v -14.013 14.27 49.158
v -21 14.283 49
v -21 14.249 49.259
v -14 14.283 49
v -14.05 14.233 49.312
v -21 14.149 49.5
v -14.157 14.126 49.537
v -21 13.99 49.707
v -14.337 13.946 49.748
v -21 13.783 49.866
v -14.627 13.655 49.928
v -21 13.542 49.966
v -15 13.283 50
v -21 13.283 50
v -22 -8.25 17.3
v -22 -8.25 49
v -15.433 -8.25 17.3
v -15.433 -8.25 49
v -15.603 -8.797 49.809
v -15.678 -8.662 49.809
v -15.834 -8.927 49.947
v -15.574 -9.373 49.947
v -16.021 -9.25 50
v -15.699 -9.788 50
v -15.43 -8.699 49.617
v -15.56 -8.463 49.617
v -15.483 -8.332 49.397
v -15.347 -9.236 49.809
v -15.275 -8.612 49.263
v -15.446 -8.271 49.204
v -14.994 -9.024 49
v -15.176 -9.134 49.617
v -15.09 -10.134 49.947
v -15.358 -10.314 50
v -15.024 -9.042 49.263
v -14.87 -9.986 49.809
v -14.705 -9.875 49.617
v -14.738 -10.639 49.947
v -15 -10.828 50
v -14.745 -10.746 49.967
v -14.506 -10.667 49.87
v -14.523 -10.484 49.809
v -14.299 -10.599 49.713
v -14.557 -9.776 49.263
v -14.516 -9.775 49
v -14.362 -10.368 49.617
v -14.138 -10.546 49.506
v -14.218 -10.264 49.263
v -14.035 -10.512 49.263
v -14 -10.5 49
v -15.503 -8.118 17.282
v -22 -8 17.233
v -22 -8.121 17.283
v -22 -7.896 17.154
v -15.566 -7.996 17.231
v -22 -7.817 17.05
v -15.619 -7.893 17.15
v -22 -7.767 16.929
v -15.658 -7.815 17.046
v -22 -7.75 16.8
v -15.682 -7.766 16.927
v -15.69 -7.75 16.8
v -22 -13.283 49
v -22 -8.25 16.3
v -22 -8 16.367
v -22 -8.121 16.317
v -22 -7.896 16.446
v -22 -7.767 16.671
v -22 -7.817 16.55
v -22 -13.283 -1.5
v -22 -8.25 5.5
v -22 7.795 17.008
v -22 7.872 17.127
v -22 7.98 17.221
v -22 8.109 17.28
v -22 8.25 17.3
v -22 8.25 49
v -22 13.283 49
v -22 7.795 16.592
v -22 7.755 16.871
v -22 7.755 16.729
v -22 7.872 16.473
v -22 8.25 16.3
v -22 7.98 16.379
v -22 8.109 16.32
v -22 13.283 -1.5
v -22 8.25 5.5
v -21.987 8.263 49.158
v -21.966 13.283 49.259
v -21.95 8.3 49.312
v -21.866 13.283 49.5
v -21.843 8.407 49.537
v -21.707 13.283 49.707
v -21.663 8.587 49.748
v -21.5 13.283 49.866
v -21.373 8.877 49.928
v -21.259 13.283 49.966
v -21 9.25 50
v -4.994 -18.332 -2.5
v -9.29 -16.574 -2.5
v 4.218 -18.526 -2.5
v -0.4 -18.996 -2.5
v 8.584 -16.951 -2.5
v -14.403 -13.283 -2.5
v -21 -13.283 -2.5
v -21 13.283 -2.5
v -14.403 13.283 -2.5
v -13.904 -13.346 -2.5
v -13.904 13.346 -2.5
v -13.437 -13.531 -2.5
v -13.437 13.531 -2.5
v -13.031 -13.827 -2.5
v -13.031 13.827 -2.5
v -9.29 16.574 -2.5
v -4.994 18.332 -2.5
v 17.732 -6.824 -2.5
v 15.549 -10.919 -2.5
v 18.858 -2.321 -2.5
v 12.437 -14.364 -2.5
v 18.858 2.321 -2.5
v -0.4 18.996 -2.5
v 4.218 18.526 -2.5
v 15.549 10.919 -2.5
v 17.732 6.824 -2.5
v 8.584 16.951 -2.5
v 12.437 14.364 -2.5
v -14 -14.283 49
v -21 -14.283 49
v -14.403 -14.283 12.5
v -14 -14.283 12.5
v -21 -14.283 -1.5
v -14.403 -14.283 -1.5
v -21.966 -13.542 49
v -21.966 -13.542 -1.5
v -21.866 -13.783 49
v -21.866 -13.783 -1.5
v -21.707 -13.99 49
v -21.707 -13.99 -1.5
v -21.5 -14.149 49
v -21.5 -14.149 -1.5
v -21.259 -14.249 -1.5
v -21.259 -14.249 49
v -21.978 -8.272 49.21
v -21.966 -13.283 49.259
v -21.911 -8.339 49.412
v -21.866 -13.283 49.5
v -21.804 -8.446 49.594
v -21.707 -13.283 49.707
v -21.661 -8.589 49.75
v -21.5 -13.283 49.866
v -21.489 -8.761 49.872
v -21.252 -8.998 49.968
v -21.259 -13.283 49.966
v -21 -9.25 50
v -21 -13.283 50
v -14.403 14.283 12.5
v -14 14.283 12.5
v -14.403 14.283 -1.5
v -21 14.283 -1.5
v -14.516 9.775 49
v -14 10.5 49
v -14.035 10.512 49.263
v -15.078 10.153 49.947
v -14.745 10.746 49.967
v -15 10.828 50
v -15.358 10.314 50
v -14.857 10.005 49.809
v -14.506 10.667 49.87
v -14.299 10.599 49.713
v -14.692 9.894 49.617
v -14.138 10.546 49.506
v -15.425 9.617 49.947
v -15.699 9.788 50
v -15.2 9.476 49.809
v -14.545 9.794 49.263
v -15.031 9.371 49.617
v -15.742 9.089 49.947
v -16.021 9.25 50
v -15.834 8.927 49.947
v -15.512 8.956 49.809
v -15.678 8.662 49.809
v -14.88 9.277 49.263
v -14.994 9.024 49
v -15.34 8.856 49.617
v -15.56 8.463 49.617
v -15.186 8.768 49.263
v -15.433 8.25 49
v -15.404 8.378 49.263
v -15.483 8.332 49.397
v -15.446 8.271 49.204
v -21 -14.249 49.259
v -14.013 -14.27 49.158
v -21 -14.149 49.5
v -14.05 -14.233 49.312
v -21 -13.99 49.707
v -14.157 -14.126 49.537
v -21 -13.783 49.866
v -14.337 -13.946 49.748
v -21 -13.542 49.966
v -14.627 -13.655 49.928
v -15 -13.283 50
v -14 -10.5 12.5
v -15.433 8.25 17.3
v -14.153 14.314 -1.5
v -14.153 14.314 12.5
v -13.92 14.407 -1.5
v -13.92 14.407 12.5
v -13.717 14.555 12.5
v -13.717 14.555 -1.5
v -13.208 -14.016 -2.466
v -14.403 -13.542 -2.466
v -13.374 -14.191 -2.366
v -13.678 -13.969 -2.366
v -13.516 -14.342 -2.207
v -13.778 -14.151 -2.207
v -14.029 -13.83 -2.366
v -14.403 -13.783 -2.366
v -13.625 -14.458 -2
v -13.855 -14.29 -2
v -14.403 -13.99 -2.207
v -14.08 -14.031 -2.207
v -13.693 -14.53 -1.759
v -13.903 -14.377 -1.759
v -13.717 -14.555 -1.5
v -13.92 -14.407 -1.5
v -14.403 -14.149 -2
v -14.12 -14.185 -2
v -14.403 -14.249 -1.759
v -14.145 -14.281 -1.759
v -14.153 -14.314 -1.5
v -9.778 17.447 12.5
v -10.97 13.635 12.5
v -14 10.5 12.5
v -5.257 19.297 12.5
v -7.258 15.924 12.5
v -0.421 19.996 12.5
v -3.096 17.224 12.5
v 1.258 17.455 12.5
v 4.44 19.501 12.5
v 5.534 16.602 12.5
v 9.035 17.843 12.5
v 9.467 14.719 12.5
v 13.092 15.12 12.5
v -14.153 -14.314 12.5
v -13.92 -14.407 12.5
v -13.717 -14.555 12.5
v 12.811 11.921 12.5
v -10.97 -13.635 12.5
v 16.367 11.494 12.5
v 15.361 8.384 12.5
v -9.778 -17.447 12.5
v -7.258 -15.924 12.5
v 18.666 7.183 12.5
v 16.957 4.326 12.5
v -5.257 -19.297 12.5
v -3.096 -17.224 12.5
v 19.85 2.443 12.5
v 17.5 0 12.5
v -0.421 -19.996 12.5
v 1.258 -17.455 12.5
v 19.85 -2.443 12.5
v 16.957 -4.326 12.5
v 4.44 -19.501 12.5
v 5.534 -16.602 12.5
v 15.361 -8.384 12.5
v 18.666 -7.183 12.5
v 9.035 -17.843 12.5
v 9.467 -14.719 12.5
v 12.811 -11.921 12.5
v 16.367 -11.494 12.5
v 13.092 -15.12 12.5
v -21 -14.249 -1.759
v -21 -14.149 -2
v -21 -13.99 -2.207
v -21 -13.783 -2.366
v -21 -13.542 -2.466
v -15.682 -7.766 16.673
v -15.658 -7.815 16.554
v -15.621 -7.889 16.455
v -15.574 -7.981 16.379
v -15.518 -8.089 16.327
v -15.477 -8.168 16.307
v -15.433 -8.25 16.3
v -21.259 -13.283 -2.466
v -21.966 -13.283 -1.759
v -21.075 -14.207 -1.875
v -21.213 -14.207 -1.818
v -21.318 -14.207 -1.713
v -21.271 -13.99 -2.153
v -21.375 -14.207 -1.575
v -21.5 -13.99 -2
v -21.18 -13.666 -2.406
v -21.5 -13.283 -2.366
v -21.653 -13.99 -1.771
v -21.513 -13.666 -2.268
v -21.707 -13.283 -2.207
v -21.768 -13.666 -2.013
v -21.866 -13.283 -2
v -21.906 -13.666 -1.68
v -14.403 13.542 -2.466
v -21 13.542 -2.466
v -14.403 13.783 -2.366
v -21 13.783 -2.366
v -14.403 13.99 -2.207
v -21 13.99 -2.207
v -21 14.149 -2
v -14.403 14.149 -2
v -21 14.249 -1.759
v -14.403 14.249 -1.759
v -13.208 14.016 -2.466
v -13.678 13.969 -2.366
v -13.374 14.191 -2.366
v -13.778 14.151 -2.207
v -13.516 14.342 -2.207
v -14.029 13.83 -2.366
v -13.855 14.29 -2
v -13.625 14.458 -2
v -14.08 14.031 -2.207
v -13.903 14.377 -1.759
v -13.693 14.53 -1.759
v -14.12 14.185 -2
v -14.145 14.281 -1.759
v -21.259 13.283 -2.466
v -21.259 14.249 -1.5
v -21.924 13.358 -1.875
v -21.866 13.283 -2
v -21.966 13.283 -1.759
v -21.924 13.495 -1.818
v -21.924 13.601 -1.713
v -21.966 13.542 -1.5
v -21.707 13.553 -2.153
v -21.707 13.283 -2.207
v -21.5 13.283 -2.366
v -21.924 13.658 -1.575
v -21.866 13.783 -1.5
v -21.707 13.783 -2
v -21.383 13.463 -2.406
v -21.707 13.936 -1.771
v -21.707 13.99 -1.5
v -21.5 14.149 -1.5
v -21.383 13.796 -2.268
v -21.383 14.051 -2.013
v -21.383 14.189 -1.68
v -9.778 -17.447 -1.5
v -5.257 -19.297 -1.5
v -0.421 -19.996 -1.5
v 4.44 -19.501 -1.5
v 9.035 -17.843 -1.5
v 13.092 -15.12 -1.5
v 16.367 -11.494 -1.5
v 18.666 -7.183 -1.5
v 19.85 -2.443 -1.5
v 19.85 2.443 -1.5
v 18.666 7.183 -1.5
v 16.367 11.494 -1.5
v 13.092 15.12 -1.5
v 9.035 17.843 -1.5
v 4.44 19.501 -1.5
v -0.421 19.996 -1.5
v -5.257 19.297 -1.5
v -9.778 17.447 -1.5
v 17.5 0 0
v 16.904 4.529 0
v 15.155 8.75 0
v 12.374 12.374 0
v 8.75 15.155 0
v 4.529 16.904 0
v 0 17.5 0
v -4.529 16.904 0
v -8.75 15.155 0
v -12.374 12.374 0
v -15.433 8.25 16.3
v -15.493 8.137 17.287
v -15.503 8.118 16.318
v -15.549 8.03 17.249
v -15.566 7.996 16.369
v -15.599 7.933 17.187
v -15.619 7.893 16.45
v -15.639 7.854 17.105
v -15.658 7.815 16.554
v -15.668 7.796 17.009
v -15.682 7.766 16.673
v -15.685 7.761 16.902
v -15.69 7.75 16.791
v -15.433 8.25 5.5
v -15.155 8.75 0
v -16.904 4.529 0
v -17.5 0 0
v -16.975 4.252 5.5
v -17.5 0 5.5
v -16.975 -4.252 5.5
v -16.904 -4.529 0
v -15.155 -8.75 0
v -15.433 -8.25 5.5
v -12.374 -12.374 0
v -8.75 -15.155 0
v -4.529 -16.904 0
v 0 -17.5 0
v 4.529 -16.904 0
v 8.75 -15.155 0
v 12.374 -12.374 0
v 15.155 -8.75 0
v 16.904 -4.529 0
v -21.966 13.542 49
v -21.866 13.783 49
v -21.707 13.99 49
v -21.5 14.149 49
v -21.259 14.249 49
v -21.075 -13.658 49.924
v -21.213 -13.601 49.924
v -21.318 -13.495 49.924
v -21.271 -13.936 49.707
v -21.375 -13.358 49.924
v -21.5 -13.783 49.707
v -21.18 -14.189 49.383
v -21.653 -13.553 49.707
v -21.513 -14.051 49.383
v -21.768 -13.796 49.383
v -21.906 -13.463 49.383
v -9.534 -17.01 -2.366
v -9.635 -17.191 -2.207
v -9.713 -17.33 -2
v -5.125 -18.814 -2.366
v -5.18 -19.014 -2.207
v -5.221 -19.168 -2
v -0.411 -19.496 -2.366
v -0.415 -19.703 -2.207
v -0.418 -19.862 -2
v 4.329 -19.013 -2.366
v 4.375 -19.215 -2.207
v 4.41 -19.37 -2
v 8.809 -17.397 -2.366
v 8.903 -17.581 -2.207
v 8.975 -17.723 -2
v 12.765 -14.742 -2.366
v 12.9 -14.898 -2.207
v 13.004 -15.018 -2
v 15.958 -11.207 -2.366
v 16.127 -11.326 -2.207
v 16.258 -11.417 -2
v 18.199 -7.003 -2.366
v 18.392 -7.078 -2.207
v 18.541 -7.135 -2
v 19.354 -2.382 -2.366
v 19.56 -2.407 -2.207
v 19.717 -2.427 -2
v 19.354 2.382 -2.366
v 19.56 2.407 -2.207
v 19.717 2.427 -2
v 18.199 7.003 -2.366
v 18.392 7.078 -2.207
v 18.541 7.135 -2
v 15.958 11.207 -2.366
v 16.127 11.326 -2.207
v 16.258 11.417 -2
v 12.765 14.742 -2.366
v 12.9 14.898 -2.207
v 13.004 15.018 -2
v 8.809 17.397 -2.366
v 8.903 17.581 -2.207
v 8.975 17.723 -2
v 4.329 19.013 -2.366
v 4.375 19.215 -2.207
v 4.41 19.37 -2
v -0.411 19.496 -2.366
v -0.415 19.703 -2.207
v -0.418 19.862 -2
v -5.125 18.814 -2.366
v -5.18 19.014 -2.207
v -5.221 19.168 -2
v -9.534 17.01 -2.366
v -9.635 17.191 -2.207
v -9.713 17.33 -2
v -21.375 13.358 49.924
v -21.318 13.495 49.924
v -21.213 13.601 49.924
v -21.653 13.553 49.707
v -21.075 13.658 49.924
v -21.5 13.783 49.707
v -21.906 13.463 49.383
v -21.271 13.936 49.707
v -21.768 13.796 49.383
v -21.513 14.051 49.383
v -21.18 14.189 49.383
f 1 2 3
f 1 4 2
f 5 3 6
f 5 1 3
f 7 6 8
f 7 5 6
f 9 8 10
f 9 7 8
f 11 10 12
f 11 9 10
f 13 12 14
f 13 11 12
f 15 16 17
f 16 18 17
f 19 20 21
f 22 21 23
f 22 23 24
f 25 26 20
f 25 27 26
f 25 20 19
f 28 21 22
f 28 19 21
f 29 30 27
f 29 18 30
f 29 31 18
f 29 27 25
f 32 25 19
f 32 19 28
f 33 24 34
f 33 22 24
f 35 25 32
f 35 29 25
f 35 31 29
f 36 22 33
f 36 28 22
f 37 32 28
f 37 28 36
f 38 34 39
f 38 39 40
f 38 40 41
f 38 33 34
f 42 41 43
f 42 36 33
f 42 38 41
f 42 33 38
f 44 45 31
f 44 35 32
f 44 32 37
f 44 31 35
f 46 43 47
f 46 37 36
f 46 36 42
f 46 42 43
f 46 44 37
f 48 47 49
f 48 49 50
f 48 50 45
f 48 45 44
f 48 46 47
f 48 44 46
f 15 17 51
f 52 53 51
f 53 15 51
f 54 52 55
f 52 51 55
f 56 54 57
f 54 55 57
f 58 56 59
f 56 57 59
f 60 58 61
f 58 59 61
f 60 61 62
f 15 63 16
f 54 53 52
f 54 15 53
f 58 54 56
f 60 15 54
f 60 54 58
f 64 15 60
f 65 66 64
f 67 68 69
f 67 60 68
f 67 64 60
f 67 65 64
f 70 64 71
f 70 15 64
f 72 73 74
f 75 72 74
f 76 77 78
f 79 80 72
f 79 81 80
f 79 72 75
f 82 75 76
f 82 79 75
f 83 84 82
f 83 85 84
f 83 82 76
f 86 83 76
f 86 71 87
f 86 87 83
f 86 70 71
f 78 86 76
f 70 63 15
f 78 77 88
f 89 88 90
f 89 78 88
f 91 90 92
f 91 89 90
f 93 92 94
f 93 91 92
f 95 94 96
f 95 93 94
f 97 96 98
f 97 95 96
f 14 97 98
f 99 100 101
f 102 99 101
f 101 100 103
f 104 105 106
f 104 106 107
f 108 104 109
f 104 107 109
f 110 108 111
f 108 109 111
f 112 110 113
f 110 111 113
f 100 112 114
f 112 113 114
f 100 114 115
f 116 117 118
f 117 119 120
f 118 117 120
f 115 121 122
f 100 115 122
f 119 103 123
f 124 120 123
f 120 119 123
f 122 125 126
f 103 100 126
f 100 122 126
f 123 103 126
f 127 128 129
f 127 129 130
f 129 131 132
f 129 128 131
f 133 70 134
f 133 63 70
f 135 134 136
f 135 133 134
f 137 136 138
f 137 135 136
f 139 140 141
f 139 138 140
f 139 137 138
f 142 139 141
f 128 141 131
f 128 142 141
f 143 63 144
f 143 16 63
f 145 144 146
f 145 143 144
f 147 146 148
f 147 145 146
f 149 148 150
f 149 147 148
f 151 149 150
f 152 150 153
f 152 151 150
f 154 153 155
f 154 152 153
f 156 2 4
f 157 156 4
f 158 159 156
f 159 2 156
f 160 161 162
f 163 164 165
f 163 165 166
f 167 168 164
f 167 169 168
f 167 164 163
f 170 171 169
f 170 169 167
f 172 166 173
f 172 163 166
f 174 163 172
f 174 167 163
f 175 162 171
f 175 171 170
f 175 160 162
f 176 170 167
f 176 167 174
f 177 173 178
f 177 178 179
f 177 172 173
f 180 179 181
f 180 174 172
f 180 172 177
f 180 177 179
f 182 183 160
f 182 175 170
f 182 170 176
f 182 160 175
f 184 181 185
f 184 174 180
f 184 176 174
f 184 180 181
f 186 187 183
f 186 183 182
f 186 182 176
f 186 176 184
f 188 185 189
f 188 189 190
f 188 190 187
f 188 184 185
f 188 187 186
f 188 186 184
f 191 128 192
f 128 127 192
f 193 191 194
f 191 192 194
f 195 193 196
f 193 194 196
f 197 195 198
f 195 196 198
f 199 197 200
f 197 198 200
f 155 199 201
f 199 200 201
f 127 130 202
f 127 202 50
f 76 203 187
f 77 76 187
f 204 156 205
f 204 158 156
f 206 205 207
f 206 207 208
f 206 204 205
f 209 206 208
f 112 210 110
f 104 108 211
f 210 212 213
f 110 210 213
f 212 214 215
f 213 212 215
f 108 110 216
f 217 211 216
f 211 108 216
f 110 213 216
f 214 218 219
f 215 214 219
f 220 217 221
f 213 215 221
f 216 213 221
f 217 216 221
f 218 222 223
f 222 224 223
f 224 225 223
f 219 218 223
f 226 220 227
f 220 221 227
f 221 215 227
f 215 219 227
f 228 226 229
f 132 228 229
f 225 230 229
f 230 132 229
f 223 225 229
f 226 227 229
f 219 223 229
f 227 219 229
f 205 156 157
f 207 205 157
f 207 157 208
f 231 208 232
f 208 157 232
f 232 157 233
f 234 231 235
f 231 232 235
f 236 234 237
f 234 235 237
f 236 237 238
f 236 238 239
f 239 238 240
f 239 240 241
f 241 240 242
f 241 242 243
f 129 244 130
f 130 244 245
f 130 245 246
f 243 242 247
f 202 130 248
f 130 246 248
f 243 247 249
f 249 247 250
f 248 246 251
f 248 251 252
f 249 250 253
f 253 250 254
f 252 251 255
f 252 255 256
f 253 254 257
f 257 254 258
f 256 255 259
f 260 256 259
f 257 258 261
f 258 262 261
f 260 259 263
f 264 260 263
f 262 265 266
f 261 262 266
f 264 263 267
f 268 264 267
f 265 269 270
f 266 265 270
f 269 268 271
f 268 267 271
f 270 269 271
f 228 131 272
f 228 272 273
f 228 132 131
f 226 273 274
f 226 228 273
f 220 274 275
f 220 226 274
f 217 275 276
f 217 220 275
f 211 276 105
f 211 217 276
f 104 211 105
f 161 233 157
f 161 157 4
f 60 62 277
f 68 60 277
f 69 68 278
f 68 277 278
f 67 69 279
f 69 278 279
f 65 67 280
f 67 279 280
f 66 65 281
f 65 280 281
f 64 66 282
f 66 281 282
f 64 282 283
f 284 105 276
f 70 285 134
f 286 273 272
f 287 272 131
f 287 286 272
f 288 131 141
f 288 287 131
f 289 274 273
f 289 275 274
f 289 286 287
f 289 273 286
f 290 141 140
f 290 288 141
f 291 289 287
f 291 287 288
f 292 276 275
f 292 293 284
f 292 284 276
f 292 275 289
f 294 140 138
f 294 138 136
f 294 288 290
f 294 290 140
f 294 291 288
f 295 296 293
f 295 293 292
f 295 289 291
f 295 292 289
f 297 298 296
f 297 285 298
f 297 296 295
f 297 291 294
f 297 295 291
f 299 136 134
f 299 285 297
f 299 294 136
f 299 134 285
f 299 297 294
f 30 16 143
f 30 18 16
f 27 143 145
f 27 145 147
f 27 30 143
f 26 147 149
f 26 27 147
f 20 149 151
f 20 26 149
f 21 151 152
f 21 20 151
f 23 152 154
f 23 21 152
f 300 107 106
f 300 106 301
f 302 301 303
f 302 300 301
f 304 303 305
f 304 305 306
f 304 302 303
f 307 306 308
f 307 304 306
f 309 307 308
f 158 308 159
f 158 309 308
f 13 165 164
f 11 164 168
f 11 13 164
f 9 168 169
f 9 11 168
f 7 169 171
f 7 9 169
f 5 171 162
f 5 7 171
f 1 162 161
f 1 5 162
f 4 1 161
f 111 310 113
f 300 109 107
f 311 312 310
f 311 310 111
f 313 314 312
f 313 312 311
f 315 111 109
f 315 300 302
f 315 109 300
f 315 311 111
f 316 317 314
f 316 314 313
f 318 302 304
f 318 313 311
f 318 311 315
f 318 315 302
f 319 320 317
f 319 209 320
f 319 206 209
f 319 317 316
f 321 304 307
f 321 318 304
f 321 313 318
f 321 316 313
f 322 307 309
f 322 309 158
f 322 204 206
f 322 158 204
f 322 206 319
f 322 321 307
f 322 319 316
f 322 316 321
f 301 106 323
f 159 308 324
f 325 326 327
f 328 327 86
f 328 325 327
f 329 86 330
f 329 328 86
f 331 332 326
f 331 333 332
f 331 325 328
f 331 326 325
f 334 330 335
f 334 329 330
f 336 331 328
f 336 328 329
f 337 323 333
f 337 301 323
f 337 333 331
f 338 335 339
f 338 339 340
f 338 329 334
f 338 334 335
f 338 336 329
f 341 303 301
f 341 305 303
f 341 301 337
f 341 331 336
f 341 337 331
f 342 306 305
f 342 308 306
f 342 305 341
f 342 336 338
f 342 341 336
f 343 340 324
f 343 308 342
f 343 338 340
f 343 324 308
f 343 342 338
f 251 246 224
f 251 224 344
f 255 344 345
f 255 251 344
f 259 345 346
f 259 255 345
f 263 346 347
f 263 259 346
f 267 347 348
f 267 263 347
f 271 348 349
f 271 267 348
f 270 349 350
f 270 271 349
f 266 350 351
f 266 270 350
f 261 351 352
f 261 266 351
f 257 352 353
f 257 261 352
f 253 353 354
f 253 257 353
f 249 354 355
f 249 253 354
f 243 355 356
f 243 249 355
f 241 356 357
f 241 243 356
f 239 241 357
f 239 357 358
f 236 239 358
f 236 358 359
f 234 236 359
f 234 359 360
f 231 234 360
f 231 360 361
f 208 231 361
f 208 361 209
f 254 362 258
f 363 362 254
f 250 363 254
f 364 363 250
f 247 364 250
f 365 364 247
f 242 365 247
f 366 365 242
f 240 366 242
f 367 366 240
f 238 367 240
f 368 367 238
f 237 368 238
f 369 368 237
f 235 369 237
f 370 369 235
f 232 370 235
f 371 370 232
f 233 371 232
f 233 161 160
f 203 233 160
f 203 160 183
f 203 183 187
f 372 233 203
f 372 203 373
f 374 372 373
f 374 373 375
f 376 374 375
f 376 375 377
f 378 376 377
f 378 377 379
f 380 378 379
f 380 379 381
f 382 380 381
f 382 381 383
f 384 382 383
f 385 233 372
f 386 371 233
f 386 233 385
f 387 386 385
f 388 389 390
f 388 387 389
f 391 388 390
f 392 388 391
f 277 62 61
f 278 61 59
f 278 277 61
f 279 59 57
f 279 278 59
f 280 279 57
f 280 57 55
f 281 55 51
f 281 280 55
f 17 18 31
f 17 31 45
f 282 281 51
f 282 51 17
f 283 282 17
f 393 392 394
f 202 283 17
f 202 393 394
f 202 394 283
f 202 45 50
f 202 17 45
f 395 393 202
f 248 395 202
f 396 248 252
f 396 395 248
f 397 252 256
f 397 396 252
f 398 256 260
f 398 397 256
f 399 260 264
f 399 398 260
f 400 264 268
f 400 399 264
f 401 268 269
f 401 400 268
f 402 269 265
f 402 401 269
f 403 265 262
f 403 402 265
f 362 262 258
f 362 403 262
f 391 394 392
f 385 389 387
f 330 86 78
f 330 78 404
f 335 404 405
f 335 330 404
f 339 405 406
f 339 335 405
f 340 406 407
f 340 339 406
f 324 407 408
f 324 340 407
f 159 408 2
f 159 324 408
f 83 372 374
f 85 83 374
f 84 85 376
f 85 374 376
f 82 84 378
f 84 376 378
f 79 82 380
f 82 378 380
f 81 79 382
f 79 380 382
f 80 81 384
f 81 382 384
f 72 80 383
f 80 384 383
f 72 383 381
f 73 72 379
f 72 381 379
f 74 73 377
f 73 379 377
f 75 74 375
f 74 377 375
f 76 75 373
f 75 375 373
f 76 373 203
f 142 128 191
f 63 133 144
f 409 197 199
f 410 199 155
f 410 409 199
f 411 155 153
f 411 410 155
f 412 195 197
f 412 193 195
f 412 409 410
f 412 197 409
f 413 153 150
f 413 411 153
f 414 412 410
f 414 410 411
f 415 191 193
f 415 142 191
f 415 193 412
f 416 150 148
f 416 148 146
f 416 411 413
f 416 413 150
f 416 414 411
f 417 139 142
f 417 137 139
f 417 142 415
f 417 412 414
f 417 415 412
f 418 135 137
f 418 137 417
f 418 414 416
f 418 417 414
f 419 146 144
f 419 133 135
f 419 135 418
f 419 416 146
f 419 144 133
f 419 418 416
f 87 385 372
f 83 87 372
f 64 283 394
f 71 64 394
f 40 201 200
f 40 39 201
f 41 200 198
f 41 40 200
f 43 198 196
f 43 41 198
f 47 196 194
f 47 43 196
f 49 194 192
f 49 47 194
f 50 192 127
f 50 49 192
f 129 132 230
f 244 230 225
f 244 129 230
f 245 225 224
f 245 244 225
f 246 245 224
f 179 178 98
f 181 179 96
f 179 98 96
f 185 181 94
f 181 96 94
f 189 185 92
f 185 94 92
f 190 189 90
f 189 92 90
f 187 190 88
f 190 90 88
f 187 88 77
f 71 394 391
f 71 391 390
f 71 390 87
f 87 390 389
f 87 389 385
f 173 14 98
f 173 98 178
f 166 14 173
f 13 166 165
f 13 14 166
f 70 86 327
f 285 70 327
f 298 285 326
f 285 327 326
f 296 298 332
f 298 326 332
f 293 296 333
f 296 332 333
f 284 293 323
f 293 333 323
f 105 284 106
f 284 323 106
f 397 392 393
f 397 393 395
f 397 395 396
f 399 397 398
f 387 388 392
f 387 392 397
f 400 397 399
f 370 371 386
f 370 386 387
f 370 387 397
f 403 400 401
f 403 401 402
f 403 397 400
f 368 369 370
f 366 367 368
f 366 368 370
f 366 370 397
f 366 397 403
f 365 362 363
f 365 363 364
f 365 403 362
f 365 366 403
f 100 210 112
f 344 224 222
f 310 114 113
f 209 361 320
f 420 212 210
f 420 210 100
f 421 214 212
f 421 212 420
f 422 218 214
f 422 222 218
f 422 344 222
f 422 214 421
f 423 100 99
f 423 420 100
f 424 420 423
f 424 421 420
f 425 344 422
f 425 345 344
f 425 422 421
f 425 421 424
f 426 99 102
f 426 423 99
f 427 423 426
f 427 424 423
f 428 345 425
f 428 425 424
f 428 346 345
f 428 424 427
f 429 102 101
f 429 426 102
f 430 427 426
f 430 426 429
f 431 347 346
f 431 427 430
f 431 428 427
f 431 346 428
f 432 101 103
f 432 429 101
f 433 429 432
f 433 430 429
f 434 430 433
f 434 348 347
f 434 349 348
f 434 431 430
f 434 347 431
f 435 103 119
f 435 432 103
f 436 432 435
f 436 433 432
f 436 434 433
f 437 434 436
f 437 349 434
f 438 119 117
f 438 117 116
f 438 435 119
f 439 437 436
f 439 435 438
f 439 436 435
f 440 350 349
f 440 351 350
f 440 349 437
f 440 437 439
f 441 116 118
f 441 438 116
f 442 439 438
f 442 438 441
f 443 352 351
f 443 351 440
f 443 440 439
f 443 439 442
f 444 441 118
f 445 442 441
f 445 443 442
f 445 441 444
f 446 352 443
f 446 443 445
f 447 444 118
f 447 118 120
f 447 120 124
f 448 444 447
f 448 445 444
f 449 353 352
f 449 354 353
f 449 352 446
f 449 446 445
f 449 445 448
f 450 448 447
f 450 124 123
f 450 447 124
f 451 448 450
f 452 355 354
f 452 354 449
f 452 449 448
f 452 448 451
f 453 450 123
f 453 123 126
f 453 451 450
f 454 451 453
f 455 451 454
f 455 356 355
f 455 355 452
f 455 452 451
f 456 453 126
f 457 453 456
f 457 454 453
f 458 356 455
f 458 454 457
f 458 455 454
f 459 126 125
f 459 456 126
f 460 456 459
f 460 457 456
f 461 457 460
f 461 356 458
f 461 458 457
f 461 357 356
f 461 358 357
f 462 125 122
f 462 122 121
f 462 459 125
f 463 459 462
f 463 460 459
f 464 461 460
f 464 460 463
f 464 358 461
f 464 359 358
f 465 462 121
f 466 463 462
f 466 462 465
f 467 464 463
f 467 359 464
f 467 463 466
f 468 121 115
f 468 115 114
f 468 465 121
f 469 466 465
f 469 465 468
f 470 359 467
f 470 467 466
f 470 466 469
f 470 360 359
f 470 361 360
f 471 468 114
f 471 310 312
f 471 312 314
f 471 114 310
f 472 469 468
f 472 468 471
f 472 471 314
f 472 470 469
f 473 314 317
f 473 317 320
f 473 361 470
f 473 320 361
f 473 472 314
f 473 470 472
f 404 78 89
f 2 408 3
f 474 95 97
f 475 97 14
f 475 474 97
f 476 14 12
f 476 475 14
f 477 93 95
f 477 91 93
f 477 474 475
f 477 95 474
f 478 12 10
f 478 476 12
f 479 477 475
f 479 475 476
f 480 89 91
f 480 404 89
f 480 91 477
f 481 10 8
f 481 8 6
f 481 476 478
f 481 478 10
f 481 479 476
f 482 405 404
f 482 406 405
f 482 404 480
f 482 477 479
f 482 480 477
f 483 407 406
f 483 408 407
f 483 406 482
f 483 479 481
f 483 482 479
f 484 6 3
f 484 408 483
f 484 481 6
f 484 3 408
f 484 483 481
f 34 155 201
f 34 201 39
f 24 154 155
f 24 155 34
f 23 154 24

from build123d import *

# Parameters (mm, degrees)
F0_R      = 20
F1_DEPTH  = 50
F2_DEPTH  = 2.5
F4_W      = 40
F4_H      = 50
F5_DEPTH  = 25
F6_W      = 8
F6_H      = 28.5657137142
F7_DEPTH  = 2.5
F8_DEPTH  = 50
F3_R      = 17.5
F9_DEPTH  = 50
F11_DEPTH = 25
F12_R     = 1


with BuildPart() as f1:
    # F0 (on Top) → F1 (new body)
    with BuildSketch(Plane.XY):
        Circle(F0_R)
    extrude(amount=F1_DEPTH)

    # F2 (add): a face of the model
    f2_faces = [f1.faces().sort_by_distance(p)[0] for p in [
        (0, 0, 0),
    ]]
    extrude(f2_faces, amount=F2_DEPTH)

    # F4 (on Front) → F5 (cut, symmetric)
    with BuildSketch(Plane.XZ):
        with Locations((6, 37.5)):
            Rectangle(F4_W, F4_H)
    extrude(amount=F5_DEPTH, both=True, mode=Mode.SUBTRACT)

    # F6 (on Top) → F7 (join)
    with BuildSketch(Plane.XY):
        with Locations((-18, 0)):
            Rectangle(F6_W, F6_H)
    extrude(amount=-F7_DEPTH)

    # F6 (on Top) → F8 (join)
    with BuildSketch(Plane.XY):
        with Locations((-18, 0)):
            Rectangle(F6_W, F6_H)
    extrude(amount=F8_DEPTH)

    # F3 (on Top) → F9 (cut)
    with BuildSketch(Plane.XY):
        Circle(F3_R)
    extrude(amount=F9_DEPTH, mode=Mode.SUBTRACT)

    # F10 (on Right) → F11 (cut)
    with BuildSketch(Plane.YZ):
        with BuildLine():
            Line((8.25, 17.3), (8.25, 50.5))
            Line((8.25, 50.5), (-8.25, 50.5))
            Line((-8.25, 50.5), (-8.25, 17.3))
            ThreePointArc((-8.25, 17.3), (-7.8964466094, 17.1535533906), (-7.75, 16.8))
            ThreePointArc((-7.75, 16.8), (-7.8964466094, 16.4464466094), (-8.25, 16.3))
            Line((-8.25, 16.3), (-8.25, 5.5))
            Line((-8.25, 5.5), (8.25, 5.5))
            Line((8.25, 5.5), (8.25, 16.3))
            ThreePointArc((8.25, 16.3), (7.75, 16.8), (8.25, 17.3))
        make_face()
    extrude(amount=-F11_DEPTH, mode=Mode.SUBTRACT)

    # F12
    f12_edges = [f1.edges().sort_by_distance(p)[0] for p in [
        (20, 0, -2.5),
        (-18, 14.282857, -2.5),
        (-22, 0, -2.5),
        (-18, -14.282857, -2.5),
        (-14, -14.282857, 5),
        (-14, 14.282857, 5),
        (-22, 14.282857, 23.75),
        (-22, -14.282857, 23.75),
        (-14.759599, -9.402352, 50),
        (-14, -12.391428, 50),
        (-18, -14.282857, 50),
        (-22, -11.266428, 50),
        (-18.716662, -8.25, 50),
        (-14, 12.391428, 50),
        (-14.759599, 9.402352, 50),
        (-18.716662, 8.25, 50),
        (-22, 11.266428, 50),
        (-18, 14.282857, 50),
    ]]
    fillet(f12_edges, radius=F12_R)


solid = f1.part
